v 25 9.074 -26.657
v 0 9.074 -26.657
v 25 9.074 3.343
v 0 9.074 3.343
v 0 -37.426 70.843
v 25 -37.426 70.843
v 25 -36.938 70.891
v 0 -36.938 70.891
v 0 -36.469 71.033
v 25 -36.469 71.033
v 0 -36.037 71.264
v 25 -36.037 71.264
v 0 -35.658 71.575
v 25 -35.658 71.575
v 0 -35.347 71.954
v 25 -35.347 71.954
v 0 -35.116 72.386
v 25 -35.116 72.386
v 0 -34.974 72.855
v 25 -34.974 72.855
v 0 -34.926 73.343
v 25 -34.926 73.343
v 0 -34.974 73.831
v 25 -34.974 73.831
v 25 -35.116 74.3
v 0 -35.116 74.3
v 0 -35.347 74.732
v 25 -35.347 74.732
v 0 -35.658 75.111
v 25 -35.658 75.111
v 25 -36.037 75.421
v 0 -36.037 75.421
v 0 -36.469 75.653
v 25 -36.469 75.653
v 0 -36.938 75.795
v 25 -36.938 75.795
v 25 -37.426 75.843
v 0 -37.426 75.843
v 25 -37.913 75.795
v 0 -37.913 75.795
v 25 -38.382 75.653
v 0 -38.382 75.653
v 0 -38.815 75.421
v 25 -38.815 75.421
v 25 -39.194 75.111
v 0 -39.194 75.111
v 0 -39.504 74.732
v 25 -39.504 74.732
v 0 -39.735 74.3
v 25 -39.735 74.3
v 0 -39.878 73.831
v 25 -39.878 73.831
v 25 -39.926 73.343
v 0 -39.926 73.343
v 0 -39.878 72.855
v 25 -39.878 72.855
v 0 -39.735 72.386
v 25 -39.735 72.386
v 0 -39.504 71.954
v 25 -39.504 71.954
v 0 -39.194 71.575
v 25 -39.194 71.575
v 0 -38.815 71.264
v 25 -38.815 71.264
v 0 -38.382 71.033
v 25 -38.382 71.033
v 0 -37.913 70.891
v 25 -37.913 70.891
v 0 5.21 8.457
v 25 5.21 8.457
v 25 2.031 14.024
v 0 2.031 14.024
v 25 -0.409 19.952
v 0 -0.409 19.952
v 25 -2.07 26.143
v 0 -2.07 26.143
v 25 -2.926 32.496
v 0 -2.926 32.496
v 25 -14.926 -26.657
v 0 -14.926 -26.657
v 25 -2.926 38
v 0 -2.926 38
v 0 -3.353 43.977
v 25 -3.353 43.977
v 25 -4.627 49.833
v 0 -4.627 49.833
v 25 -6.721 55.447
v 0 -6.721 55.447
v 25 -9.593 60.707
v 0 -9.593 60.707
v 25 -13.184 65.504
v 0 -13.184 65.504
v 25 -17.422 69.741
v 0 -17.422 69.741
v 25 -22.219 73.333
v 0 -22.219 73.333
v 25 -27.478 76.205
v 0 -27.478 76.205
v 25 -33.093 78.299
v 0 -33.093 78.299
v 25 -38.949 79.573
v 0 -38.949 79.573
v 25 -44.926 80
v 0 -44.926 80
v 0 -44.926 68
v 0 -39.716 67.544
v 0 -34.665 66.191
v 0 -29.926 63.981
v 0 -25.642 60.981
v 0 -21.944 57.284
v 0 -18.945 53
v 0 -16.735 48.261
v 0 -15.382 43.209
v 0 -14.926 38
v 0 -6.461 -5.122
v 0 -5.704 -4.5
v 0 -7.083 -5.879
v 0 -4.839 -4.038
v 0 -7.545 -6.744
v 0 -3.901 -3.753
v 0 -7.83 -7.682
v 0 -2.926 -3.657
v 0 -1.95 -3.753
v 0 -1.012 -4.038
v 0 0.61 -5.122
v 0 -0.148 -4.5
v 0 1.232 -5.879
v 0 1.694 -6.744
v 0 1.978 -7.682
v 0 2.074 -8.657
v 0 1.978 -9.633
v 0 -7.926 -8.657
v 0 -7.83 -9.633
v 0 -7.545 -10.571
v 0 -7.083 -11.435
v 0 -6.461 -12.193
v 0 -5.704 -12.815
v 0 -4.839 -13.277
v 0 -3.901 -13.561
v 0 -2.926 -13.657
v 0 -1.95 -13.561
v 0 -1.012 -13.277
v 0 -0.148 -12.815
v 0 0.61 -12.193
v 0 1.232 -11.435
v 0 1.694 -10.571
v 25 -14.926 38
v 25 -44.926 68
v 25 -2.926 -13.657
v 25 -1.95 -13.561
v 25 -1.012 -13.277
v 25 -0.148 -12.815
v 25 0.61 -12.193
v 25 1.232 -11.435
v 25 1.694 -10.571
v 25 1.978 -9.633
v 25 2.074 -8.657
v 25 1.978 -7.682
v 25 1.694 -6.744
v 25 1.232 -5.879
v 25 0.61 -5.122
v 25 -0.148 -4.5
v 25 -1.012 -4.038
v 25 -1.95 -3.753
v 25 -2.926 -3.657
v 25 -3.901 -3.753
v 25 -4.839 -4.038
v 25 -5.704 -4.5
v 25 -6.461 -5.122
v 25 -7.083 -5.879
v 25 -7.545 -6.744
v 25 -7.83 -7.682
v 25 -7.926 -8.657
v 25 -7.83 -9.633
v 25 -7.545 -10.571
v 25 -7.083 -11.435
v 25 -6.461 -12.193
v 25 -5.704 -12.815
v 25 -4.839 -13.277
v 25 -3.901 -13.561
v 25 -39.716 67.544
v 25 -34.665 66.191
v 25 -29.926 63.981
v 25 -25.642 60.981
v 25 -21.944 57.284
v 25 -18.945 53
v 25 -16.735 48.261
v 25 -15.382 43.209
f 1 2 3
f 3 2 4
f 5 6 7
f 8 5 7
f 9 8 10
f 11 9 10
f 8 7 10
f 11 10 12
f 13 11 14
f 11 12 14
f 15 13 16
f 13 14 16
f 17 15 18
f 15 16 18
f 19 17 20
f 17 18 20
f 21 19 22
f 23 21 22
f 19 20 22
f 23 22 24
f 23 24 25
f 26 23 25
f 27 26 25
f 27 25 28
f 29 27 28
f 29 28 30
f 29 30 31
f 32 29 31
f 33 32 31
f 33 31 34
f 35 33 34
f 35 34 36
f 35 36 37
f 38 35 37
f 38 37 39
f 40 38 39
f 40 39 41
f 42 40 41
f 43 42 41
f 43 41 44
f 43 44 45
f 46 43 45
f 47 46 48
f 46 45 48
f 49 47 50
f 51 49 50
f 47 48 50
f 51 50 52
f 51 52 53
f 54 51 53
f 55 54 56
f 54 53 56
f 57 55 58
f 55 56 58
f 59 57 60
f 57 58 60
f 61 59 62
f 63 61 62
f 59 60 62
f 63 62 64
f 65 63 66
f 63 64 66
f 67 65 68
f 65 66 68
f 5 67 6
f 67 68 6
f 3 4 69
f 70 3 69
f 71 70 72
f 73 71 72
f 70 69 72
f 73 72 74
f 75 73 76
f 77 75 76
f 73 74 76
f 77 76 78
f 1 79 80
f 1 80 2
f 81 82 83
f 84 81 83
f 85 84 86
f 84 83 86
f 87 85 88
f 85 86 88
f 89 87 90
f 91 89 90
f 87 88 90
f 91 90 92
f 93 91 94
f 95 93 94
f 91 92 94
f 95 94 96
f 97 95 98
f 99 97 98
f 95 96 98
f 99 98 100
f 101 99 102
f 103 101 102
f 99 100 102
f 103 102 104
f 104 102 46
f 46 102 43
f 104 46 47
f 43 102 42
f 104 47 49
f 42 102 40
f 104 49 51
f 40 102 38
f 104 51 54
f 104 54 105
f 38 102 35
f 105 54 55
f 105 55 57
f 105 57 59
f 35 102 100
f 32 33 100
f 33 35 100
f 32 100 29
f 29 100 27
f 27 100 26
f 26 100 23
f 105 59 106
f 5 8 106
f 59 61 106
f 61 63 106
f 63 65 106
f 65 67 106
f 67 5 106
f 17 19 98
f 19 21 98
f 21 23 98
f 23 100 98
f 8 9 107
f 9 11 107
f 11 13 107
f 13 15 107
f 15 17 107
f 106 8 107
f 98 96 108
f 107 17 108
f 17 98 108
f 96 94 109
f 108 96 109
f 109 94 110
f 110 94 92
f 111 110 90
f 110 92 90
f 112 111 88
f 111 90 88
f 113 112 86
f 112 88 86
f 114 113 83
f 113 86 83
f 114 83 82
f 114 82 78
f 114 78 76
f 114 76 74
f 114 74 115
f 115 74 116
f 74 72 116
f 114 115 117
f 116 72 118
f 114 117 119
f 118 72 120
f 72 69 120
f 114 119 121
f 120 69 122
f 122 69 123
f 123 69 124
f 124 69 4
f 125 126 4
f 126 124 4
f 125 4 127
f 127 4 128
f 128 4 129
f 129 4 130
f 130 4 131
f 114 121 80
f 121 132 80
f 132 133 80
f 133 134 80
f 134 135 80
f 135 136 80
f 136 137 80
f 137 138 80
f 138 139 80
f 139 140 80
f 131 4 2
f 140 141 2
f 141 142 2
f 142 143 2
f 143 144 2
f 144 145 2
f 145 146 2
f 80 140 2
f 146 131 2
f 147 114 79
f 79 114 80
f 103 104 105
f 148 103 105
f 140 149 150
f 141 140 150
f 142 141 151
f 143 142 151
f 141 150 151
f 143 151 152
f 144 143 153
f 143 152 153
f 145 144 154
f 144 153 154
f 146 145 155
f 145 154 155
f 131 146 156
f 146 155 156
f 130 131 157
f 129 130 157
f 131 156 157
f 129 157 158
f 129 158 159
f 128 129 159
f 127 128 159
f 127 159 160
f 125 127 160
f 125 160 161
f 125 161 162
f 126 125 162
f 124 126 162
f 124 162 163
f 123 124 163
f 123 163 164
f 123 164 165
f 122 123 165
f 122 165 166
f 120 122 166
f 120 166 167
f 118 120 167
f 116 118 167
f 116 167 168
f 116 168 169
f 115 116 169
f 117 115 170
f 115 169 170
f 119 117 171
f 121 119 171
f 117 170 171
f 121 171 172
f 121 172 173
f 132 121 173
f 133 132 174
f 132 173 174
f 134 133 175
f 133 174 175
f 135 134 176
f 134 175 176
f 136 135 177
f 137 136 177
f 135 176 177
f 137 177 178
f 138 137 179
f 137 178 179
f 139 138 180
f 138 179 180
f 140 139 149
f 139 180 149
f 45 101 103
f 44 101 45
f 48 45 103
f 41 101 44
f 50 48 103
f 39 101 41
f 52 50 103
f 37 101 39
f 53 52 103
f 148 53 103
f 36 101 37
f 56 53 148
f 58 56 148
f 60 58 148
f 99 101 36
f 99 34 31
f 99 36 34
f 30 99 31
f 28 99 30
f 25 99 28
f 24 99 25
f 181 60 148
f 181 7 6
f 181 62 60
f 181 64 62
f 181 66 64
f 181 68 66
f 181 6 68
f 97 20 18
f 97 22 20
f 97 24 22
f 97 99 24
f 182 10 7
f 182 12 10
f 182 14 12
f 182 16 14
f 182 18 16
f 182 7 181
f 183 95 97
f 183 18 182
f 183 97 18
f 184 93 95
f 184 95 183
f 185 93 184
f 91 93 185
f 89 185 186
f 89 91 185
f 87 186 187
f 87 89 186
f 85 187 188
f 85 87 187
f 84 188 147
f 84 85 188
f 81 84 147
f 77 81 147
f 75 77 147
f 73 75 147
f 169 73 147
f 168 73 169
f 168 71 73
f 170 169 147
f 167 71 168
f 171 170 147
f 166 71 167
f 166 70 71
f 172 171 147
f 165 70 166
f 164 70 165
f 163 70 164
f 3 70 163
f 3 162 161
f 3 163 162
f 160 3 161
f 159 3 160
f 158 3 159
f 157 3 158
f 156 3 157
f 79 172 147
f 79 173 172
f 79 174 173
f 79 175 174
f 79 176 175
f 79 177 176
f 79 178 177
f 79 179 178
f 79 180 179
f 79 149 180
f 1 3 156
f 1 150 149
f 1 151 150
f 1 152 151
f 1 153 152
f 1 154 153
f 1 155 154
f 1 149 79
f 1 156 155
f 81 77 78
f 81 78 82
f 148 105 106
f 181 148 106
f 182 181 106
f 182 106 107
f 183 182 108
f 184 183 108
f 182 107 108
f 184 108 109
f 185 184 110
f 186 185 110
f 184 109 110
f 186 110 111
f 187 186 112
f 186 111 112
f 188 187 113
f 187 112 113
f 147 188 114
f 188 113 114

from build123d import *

# Parameters (mm, degrees)
BOSS_EXTRUDE6_DEPTH = 25
SKETCH3_R           = 5
CUT_EXTRUDE1_DEPTH  = 96.096384068
SKETCH4_R           = 2.5
CUT_EXTRUDE2_DEPTH  = 96.096384068


with BuildPart() as part:
    # Sketch2 → Boss-Extrude6 (new body)
    with BuildSketch(Plane(origin=(0, 0, 0), x_dir=(0, 0, -1), z_dir=(1, 0, 0))):
        with BuildLine():
            Line((-32.496153619, -2.925741651), (-38, -2.925741651))
            ThreePointArc((-38, -2.925741651), (-67.69848481, -15.227256841), (-80, -44.925741651))
            Line((-80, -44.925741651), (-68, -44.925741651))
            ThreePointArc((-68, -44.925741651), (-59.213203436, -23.712538215), (-38, -14.925741651))
            Line((-38, -14.925741651), (-22.688150378, -14.925741651))
            Line((-22.688150378, -14.925741651), (26.657177064, -14.925741651))
            Line((26.657177064, -14.925741651), (26.657177064, 9.074258349))
            Line((26.657177064, 9.074258349), (-3.342822936, 9.074258349))
            ThreePointArc((-3.342822936, 9.074258349), (-16.948948047, 0.716384993), (-32.496153619, -2.925741651))
        make_face()
    extrude(amount=BOSS_EXTRUDE6_DEPTH)

    # Sketch3 → Cut-Extrude1 (cut, through all)
    with BuildSketch(Plane(origin=(25, 0, 0), x_dir=(0, 0, -1), z_dir=(1, 0, 0))):
        with Locations((8.657177064, -2.925741651)):
            Circle(SKETCH3_R)
    extrude(amount=-CUT_EXTRUDE1_DEPTH, mode=Mode.SUBTRACT)

    # Sketch4 → Cut-Extrude2 (cut, through all)
    with BuildSketch(Plane(origin=(25, 0, 0), x_dir=(0, 0, -1), z_dir=(1, 0, 0))):
        with Locations((-73.342822936, -37.425741651)):
            Circle(SKETCH4_R)
    extrude(amount=-CUT_EXTRUDE2_DEPTH, mode=Mode.SUBTRACT)


solid = part.part
